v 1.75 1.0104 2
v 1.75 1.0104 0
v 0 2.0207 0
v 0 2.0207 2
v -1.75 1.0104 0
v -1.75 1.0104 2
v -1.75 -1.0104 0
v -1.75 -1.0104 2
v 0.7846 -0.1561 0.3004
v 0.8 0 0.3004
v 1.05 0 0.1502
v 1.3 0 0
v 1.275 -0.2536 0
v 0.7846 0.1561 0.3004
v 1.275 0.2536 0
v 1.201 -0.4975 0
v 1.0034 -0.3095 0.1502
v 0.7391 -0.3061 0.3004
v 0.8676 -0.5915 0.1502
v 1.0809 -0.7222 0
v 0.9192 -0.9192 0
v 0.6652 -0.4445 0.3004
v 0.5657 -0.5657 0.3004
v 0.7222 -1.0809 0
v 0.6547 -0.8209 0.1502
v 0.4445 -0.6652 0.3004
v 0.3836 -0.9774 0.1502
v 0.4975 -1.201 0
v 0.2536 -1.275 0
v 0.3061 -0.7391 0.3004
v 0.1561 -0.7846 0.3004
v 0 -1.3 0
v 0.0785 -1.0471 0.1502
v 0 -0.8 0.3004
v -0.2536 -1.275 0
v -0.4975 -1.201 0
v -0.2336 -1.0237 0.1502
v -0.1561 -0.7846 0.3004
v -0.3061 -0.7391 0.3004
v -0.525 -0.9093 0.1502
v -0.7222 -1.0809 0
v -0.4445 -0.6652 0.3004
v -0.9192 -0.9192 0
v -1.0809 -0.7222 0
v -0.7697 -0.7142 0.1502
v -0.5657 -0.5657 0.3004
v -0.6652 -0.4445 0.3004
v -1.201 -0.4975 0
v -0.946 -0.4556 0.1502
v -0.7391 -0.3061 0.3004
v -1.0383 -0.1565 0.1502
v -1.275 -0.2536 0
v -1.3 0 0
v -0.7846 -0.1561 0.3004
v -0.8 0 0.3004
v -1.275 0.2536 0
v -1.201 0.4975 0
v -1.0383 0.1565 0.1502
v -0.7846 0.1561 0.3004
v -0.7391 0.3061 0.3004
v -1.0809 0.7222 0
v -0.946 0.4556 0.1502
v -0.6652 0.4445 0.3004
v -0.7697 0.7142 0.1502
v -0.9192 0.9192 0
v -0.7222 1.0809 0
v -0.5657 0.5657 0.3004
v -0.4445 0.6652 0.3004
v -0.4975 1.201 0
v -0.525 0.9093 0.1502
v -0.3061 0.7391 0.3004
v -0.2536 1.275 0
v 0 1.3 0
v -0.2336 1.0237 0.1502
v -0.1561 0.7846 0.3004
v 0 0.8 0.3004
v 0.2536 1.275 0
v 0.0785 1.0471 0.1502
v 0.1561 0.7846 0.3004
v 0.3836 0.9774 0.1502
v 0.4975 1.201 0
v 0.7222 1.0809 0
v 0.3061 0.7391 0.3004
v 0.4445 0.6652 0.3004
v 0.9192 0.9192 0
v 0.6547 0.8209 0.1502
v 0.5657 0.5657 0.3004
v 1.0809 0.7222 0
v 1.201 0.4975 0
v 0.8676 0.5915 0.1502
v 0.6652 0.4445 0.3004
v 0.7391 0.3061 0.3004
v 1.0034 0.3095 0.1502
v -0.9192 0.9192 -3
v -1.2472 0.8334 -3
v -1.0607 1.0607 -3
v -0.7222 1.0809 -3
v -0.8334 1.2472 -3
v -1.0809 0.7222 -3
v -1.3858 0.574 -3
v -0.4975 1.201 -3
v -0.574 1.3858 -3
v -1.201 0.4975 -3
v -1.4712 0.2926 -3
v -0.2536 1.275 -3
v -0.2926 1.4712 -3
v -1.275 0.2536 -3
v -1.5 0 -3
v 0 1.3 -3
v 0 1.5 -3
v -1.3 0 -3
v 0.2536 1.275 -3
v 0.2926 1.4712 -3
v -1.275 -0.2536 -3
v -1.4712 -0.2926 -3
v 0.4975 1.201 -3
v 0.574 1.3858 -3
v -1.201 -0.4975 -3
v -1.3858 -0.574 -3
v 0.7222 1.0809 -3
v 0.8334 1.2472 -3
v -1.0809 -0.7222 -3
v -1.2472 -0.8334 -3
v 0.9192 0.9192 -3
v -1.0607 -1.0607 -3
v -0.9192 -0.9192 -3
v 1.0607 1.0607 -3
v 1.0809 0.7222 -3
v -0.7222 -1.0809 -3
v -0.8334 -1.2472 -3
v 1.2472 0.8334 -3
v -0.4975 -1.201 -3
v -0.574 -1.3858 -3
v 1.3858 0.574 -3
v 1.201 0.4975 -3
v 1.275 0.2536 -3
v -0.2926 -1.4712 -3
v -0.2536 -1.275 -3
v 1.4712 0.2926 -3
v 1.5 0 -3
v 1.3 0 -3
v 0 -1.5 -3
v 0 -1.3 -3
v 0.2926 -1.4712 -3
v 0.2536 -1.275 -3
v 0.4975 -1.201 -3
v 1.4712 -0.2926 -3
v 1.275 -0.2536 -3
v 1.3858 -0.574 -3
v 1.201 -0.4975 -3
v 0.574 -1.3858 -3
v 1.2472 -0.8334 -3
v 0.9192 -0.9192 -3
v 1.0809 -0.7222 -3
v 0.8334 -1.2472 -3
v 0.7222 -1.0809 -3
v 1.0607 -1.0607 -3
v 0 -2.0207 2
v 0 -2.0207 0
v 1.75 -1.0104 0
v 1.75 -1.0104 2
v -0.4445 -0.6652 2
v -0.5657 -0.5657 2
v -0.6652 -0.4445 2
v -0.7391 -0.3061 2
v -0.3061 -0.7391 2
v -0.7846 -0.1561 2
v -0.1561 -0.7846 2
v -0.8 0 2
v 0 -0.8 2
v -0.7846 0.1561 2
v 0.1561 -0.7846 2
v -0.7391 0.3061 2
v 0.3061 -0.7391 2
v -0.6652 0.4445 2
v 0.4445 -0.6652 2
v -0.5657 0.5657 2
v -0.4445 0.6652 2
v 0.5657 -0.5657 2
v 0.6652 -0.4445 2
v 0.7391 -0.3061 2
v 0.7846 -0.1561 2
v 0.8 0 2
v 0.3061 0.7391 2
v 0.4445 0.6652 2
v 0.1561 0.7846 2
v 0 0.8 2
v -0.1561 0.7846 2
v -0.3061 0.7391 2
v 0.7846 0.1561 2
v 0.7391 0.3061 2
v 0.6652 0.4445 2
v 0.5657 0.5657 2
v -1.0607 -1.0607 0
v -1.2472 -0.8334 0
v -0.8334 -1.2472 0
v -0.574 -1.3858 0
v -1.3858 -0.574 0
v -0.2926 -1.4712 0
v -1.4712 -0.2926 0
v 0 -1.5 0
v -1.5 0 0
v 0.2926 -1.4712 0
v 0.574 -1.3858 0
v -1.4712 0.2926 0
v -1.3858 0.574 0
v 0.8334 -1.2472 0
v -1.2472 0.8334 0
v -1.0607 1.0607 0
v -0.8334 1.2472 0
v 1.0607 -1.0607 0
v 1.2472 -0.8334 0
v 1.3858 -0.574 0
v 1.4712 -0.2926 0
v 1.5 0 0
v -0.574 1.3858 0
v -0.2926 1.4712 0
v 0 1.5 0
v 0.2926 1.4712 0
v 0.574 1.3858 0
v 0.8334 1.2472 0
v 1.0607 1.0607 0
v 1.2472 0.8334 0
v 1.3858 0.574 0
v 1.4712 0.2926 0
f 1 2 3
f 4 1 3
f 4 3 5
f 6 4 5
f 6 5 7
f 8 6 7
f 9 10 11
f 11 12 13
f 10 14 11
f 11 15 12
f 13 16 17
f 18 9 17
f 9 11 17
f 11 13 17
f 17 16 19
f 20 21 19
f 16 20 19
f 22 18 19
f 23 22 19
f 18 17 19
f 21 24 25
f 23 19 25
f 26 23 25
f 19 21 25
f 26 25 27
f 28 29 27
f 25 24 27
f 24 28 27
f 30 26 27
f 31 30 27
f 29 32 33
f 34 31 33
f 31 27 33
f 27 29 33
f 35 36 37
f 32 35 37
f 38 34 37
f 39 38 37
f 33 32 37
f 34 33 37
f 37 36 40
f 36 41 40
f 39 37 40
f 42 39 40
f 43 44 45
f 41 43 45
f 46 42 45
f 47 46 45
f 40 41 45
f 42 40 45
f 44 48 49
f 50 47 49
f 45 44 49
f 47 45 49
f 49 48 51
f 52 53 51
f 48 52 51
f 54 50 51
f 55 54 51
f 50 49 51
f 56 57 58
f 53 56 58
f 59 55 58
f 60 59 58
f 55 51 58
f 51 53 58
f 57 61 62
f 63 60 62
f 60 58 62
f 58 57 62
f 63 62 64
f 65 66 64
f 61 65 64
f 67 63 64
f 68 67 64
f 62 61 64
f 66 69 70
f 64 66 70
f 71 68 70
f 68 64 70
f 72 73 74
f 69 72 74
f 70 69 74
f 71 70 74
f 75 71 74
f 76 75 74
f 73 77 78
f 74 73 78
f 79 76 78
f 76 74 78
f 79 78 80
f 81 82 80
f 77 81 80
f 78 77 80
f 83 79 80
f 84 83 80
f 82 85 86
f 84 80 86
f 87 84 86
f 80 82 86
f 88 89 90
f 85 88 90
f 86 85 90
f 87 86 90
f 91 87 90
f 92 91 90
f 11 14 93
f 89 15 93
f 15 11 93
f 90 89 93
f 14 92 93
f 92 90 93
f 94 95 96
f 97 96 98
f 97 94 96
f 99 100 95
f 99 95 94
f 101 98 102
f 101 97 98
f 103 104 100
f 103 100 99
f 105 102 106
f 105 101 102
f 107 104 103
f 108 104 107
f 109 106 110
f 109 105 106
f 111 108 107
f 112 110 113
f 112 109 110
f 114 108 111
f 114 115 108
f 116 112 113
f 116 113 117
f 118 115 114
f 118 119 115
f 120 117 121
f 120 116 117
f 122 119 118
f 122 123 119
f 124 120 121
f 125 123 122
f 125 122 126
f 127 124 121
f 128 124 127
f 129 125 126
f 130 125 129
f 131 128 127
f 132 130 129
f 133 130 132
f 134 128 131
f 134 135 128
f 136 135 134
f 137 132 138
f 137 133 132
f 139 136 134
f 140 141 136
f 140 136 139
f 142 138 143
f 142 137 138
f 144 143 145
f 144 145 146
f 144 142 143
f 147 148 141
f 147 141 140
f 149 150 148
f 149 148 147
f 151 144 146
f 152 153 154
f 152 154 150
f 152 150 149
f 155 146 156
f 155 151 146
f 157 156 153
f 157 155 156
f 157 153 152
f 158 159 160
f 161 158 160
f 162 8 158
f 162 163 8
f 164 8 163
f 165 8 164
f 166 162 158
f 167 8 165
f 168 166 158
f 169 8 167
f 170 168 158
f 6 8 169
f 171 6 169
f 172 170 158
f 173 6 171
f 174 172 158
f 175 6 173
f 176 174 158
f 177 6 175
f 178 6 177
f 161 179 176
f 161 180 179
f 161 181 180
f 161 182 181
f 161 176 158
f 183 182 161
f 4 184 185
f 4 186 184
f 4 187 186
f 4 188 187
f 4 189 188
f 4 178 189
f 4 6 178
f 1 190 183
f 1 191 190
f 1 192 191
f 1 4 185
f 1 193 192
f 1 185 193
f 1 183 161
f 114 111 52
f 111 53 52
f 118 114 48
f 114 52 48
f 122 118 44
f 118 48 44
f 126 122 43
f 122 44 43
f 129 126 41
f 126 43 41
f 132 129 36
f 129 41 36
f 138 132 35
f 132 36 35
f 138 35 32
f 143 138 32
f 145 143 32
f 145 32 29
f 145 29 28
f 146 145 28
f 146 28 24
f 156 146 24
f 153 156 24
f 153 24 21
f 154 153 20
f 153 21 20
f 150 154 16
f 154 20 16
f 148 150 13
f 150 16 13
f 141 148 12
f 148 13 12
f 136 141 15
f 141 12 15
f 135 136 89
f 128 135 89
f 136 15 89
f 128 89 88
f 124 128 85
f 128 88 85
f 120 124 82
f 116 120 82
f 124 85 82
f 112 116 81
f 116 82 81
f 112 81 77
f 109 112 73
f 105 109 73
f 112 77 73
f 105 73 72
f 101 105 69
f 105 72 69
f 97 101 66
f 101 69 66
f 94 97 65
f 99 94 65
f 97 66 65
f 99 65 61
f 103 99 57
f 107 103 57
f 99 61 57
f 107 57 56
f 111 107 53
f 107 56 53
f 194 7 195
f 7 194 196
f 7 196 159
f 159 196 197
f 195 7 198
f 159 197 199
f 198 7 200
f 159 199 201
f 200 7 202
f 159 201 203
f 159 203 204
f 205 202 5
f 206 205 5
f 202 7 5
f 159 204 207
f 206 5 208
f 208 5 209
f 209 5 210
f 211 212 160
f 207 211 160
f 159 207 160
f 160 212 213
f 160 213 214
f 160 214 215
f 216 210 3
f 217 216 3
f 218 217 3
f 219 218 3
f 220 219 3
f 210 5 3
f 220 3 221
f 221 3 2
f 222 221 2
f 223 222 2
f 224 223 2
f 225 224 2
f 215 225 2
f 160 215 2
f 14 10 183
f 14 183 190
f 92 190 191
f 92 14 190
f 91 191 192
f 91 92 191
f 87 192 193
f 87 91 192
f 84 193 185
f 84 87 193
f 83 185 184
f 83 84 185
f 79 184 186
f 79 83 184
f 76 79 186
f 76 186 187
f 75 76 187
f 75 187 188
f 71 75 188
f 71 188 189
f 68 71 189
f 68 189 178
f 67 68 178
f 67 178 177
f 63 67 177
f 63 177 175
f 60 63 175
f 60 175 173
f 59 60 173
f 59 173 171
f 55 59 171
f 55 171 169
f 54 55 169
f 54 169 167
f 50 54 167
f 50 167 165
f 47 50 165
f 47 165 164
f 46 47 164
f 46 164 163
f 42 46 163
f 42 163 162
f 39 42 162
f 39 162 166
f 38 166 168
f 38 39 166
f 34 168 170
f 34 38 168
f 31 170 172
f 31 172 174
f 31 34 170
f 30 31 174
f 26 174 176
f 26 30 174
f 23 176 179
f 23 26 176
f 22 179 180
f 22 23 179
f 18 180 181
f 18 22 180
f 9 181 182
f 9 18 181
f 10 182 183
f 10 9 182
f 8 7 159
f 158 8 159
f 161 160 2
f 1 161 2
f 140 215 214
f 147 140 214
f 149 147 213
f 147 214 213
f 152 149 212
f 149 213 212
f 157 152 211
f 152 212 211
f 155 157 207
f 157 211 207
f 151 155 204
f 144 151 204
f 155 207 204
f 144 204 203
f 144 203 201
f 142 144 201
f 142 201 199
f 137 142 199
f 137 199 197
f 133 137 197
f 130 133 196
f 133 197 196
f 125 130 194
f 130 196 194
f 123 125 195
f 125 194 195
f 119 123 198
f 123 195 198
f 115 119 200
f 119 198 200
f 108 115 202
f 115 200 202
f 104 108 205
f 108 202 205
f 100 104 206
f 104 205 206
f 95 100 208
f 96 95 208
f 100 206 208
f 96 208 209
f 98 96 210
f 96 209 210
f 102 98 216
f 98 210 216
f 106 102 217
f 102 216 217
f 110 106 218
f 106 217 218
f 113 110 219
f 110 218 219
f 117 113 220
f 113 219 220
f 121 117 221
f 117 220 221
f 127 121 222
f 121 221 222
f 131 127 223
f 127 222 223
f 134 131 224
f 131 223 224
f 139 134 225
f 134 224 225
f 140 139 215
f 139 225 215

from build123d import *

# Parameters (mm, degrees)
F0_R     = 0.8
F1_DEPTH = 2
F2_R     = 1.5
F3_DEPTH = 3
F5_D     = 2.6
F5_DEPTH = 3
F5_TIP   = 0.7811188047


with BuildPart() as f1:
    # F0 (on Top) → F1 (new body)
    with BuildSketch(Plane.XY):
        Polygon((1.75, -1.0103629711), (1.75, 1.0103629711), (0, 2.0207259422), (-1.75, 1.0103629711), (-1.75, -1.0103629711), (0, -2.0207259422), align=None)
        Circle(F0_R, mode=Mode.SUBTRACT)
    extrude(amount=F1_DEPTH)

    # F2 (on face) → F3 (join)
    with BuildSketch(Plane(origin=(0, 0, 0), x_dir=(1, 0, 0), z_dir=(0, 0, -1))):
        Circle(F2_R)
    extrude(amount=F3_DEPTH)

    # F5
    with Locations(Plane(origin=(0, 0, -3), x_dir=(1, 0, 0), z_dir=(0, 0, -1))):
        with Locations((0, 0)):
            Hole(F5_D / 2, depth=F5_DEPTH)
            with Locations((0, 0, -(F5_DEPTH + F5_TIP / 2))):  # 118° drill point
                Cone(0, F5_D / 2, F5_TIP, mode=Mode.SUBTRACT)


solid = f1.part
